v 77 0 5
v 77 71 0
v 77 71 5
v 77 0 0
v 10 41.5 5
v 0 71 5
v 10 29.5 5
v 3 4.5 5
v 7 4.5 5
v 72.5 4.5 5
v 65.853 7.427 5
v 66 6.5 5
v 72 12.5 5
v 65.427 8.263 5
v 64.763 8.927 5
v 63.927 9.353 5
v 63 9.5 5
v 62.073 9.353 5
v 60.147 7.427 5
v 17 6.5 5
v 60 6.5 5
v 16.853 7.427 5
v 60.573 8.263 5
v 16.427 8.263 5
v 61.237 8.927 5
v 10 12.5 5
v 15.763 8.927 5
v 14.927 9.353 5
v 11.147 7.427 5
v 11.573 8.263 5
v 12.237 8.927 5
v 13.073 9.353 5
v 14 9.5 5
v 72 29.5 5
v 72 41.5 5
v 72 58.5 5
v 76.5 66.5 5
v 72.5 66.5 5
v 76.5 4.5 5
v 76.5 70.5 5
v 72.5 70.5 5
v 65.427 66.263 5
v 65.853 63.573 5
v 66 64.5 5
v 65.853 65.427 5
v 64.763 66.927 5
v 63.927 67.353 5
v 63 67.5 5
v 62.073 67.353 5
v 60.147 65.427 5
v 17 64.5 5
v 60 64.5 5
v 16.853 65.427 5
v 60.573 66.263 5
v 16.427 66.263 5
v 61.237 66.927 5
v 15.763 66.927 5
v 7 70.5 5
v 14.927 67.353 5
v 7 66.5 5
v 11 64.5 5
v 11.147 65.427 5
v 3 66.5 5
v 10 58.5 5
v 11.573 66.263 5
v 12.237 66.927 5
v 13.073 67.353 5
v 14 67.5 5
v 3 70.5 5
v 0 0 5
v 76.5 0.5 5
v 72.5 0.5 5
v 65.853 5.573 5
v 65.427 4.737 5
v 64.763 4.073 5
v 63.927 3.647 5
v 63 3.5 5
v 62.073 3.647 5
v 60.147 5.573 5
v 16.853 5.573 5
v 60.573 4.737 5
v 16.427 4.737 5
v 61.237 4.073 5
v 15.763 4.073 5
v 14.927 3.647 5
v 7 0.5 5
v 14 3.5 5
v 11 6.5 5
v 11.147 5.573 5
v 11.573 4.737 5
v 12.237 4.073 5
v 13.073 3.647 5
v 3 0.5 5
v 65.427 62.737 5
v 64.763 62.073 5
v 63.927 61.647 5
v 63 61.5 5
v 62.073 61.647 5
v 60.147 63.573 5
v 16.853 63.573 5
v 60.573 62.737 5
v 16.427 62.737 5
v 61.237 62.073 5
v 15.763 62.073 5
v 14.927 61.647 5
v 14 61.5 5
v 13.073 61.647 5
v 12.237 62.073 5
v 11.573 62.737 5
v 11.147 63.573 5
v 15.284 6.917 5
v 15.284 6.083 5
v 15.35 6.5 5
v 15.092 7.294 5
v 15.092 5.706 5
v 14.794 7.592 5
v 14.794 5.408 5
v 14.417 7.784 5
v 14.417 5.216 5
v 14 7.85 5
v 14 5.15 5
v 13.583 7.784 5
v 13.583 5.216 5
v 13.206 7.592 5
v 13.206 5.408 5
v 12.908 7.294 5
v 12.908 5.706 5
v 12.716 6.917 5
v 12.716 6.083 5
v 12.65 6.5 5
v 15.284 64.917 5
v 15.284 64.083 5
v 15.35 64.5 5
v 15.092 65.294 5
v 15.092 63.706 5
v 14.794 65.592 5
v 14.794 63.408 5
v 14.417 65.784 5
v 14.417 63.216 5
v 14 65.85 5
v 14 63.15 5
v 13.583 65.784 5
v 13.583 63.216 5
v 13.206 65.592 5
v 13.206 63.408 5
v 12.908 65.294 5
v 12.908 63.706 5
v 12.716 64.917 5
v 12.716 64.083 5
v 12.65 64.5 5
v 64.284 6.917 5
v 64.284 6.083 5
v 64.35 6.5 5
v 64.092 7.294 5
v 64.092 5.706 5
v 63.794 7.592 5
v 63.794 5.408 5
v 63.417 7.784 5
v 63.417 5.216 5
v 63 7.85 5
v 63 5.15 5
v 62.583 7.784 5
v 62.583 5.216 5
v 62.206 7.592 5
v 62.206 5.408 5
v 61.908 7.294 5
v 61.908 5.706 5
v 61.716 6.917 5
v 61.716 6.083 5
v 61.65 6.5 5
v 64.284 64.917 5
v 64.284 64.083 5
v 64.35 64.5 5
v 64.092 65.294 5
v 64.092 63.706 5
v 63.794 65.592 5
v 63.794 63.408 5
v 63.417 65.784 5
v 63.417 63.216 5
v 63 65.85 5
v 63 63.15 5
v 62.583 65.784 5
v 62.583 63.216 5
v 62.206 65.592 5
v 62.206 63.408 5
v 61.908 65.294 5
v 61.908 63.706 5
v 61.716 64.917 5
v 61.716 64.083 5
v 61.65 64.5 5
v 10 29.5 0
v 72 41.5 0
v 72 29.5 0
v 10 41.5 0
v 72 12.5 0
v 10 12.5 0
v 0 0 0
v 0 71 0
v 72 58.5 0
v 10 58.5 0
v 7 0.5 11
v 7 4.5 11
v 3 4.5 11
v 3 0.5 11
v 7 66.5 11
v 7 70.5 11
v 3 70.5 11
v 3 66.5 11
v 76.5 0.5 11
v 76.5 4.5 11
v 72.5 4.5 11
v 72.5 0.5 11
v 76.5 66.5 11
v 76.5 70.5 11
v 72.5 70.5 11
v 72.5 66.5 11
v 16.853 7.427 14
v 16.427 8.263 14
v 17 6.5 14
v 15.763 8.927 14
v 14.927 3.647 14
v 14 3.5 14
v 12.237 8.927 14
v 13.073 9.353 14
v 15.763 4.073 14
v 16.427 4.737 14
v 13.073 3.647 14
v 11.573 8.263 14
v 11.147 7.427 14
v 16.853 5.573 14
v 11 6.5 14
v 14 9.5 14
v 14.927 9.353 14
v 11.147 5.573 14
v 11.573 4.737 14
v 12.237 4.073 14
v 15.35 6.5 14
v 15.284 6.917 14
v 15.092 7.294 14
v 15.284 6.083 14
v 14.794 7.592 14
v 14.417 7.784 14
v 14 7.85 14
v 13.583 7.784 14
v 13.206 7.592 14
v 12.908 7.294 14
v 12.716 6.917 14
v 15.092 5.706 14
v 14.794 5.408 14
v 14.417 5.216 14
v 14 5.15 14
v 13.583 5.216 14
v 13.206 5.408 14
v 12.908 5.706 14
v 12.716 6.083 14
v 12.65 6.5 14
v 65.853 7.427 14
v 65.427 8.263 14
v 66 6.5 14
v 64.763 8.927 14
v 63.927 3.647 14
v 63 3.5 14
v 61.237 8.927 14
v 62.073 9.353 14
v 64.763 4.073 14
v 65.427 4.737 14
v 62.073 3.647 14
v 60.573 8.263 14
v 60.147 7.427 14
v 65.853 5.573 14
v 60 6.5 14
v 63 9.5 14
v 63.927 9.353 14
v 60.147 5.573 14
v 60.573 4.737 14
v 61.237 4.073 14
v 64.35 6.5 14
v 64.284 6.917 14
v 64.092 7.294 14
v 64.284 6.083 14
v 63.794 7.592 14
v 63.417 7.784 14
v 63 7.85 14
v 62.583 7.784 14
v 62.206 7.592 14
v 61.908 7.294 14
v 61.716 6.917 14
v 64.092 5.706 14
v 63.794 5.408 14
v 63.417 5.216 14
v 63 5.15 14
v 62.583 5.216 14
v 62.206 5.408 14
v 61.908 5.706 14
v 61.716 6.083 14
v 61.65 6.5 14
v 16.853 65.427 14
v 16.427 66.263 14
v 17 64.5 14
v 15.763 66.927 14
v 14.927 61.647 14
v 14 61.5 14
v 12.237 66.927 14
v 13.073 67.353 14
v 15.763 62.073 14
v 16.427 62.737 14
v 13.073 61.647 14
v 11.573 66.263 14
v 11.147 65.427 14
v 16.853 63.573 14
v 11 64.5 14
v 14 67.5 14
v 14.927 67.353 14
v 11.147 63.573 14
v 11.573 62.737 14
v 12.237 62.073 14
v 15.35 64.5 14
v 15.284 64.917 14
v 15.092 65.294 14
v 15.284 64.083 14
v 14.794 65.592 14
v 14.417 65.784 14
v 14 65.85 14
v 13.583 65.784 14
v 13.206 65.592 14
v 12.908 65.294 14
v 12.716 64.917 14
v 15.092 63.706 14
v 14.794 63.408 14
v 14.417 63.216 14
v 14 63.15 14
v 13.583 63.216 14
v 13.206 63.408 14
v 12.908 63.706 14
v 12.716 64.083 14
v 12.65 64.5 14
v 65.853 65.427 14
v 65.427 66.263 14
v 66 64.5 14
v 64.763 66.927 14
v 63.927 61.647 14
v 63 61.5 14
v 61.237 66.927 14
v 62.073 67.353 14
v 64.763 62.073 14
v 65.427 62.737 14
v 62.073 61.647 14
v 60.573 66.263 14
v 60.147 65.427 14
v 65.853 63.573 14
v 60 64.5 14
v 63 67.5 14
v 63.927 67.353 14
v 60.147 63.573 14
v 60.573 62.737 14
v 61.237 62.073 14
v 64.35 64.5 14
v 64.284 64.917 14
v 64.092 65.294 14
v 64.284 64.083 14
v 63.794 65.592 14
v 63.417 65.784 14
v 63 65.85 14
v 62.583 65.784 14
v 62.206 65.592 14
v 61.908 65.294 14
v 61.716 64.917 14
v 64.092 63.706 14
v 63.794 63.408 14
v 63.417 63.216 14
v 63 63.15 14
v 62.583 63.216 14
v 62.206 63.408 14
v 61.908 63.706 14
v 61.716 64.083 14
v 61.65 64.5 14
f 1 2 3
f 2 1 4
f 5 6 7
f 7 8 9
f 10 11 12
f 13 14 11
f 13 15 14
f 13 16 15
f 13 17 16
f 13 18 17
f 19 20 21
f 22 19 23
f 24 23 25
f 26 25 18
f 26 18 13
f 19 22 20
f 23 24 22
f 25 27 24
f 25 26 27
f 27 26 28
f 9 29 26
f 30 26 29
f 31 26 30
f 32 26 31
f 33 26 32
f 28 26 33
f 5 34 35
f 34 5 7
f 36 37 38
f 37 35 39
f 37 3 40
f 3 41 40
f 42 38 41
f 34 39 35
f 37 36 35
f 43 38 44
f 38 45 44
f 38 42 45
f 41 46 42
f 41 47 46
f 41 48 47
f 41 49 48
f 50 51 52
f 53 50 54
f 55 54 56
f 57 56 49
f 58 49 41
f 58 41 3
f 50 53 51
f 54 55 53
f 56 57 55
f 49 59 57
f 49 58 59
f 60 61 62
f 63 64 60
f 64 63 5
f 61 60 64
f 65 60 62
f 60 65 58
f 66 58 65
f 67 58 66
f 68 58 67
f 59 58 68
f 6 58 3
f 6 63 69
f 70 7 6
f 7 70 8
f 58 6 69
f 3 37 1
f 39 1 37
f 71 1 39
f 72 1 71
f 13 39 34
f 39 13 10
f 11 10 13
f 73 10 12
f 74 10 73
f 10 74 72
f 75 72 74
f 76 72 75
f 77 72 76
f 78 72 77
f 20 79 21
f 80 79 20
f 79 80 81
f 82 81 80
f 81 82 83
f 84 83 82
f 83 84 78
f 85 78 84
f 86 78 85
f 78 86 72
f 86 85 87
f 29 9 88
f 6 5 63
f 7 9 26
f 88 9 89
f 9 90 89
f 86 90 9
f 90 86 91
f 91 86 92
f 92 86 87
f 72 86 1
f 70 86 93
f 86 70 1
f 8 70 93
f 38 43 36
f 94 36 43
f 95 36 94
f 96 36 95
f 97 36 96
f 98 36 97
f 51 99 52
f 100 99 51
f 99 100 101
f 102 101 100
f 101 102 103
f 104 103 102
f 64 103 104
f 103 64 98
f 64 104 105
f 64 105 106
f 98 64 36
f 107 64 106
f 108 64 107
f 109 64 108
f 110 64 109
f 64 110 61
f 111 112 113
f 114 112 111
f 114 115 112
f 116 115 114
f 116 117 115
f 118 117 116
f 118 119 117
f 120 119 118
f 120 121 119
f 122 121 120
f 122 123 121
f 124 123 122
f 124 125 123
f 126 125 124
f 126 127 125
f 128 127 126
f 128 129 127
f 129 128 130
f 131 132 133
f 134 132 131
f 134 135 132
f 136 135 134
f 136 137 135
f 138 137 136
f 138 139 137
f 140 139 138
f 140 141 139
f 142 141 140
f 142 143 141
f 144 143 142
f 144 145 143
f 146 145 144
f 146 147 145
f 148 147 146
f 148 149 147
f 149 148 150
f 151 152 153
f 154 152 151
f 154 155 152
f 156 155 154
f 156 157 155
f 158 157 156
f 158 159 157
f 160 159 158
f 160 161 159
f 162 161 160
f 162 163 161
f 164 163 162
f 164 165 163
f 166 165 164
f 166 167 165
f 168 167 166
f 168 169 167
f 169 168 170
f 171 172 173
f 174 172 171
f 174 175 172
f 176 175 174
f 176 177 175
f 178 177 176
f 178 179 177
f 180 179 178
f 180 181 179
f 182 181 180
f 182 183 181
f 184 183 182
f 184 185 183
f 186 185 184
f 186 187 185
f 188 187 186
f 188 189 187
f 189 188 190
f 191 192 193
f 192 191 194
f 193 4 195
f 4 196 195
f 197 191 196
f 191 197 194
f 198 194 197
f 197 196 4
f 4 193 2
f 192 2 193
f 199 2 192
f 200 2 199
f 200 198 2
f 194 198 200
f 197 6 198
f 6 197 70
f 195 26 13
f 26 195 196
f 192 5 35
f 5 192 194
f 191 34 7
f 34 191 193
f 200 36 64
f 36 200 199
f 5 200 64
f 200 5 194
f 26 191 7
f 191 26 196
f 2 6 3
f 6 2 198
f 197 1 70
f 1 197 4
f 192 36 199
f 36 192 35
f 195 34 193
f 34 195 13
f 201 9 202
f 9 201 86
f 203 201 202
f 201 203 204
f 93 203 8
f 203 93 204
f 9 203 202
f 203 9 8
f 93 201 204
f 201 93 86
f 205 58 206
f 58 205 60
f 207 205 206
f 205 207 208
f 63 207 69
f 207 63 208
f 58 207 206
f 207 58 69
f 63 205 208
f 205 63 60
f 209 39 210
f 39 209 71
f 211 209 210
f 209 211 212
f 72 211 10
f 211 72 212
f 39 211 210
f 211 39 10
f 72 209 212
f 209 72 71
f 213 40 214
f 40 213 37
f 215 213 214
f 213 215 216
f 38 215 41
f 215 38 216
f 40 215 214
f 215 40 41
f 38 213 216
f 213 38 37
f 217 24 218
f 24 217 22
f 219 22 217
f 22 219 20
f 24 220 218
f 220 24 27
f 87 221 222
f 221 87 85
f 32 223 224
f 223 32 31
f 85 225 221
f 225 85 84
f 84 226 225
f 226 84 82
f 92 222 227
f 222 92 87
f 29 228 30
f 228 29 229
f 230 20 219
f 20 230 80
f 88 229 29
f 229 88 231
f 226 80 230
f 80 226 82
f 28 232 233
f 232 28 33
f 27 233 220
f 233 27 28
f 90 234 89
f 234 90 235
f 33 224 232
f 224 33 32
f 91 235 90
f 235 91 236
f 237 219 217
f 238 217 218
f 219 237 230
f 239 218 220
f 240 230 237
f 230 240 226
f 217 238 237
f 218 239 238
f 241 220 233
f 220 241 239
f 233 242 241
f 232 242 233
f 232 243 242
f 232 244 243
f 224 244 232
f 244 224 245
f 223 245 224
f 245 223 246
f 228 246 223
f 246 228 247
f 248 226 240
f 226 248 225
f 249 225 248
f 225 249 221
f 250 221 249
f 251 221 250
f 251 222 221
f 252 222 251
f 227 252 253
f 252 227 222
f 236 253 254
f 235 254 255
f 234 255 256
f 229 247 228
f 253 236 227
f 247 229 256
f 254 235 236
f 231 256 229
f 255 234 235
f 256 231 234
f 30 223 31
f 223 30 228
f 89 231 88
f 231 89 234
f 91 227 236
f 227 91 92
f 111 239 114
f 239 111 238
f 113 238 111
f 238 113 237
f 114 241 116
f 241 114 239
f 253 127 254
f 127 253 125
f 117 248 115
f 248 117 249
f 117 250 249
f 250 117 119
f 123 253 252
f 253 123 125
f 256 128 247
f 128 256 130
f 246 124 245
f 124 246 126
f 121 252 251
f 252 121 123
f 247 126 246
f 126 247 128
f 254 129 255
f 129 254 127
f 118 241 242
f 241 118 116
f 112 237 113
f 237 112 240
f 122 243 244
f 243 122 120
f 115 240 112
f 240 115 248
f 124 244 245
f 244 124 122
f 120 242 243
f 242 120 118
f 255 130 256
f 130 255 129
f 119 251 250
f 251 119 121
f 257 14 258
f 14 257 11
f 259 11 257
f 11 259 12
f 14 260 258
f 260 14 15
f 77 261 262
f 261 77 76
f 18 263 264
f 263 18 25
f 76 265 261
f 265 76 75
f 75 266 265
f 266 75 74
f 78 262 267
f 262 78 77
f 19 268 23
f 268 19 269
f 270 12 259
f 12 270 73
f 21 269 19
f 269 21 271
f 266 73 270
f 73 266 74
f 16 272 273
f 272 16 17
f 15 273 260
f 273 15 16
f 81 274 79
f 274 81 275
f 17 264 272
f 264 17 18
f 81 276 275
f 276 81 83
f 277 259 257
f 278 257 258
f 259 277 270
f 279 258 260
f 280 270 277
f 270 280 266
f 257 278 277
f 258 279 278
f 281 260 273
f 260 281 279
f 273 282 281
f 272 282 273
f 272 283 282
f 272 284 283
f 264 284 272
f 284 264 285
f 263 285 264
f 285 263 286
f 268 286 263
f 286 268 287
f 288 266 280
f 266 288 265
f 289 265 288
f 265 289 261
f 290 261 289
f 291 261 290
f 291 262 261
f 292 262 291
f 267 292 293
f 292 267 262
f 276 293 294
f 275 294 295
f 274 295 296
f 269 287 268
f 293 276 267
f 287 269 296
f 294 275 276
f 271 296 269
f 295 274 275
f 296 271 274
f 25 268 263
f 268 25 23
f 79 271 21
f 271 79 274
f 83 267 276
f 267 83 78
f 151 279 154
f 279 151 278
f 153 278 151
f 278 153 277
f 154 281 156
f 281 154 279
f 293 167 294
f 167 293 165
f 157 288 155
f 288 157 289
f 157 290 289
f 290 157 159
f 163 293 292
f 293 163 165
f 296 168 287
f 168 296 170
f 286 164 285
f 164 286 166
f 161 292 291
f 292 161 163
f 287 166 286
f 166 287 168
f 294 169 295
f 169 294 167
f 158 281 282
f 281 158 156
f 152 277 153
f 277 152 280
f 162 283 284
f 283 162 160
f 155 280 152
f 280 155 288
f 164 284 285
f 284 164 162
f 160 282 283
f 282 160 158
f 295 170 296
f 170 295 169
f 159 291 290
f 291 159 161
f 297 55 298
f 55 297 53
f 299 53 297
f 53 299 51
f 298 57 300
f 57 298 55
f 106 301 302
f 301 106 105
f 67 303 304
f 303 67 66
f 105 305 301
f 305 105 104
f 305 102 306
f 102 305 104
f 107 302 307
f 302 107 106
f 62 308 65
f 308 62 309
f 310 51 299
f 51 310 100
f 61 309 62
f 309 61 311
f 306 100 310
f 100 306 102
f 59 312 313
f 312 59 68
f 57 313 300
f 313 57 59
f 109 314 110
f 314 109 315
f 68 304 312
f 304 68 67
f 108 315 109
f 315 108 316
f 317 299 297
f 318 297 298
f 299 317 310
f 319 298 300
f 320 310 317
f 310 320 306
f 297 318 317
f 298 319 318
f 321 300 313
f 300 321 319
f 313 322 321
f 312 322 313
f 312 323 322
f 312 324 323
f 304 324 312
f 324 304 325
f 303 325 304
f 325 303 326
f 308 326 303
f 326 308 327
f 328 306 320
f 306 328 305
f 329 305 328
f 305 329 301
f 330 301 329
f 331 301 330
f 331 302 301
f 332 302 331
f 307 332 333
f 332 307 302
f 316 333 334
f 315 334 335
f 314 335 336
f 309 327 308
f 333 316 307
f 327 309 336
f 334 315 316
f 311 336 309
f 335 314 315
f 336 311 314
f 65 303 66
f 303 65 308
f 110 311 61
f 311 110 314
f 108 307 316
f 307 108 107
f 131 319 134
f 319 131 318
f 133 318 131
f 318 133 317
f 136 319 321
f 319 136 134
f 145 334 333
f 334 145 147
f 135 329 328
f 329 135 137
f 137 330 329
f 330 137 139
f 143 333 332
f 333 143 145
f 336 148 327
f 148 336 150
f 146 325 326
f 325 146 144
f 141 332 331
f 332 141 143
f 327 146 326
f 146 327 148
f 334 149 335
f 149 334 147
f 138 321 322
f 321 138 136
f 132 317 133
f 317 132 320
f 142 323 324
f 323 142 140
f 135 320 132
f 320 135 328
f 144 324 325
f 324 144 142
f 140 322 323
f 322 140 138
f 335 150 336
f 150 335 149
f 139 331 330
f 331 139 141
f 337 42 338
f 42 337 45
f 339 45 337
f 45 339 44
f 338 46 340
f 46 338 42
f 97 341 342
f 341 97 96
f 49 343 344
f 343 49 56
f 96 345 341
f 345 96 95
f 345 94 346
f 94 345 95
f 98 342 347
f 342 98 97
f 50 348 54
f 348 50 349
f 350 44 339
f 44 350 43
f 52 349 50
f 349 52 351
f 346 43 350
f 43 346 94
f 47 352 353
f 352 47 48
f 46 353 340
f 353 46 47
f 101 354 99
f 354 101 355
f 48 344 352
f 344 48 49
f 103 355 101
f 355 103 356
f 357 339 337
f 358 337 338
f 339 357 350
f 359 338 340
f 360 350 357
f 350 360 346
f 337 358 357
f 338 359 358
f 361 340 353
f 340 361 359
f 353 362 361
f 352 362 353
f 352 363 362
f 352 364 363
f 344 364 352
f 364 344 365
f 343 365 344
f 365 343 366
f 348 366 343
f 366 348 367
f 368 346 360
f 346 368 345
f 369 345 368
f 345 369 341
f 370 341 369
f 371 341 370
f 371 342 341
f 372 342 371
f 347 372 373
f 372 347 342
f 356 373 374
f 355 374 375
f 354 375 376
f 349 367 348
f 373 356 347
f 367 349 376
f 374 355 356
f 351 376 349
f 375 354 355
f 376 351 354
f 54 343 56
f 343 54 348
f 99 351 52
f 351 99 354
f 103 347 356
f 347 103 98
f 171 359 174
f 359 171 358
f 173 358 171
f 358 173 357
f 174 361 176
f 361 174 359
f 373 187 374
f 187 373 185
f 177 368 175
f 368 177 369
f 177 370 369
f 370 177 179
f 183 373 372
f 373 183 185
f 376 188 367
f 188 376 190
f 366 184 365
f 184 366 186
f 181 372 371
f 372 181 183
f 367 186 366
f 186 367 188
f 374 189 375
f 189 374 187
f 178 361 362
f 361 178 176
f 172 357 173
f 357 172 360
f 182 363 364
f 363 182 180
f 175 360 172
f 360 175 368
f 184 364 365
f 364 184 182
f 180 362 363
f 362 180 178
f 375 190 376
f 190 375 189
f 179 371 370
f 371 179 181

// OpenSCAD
// Neato XV Signature Pro - Outer Left Pod BASE
// Print flat (ribbed face down), no supports needed.
// Has 4x4x6mm raised bosses at all 4 post locations.
// Bosses fit into matching sockets in outer_left_pod_sides.scad.
//
// PRINT ORIENTATION: ribbed bottom face flat on bed, standoffs point up.

// ============================================================
// PARAMETERS (must match outer_left_pod_sides.scad)
// ============================================================

pod_width  = 77;
pod_depth  = 71;

rail_w       = 5;
outer_rail_w = 10;
rib_w        = 12;

standoff_h    = 9;
standoff_od   = 6;
standoff_hole = 2.7; // M2.5


boss_size = 4;
boss_h    = 6;

yahboom_hole_x_span = 49;
yahboom_hole_y_span = 58;

yahboom_x_left  = (pod_width - yahboom_hole_x_span) / 2;
yahboom_x_right = yahboom_x_left + yahboom_hole_x_span;

yahboom_y_front = (pod_depth - yahboom_hole_y_span) / 2;
yahboom_y_rear  = yahboom_y_front + yahboom_hole_y_span;
yahboom_y_mid   = (yahboom_y_front + yahboom_y_rear) / 2;

rib_positions = [yahboom_y_front, yahboom_y_mid, yahboom_y_rear];

yahboom_holes = [
    [yahboom_x_left,  yahboom_y_front],
    [yahboom_x_right, yahboom_y_front],
    [yahboom_x_left,  yahboom_y_rear ],
    [yahboom_x_right, yahboom_y_rear ],
];

// Boss locations — center of each post footprint
// Outer (left) side: back, front
// Inner (right) side: back, front
boss_locations = [
    [outer_rail_w/2,          rail_w/2              ],  // outer back
    [outer_rail_w/2,          pod_depth - rail_w/2  ],  // outer front
    [pod_width - rail_w/2,    rail_w/2              ],  // inner back
    [pod_width - rail_w/2,    pod_depth - rail_w/2  ],  // inner front
];

// ============================================================
// MODULES
// ============================================================

module ribbed_bottom() {
    // Outer (left) edge — extra thick
    cube([outer_rail_w, pod_depth, rail_w]);
    // Inner (right) edge
    translate([pod_width - rail_w, 0, 0])
        cube([rail_w, pod_depth, rail_w]);
    // Back edge
    cube([pod_width, rail_w, rail_w]);
    // Front edge
    translate([0, pod_depth - rail_w, 0])
        cube([pod_width, rail_w, rail_w]);

    // Ribs — gaps between ribs provide cable routing space
    for (y_center = rib_positions) {
        translate([0, y_center - rib_w / 2, 0])
            cube([pod_width, rib_w, rail_w]);
    }
}

module standoff(h, hole_d) {
    difference() {
        cylinder(h=h, d=standoff_od, $fn=20);
        cylinder(h=h + 0.1, d=hole_d, $fn=20);
    }
}

// ============================================================
// MAIN
// ============================================================

union() {
    ribbed_bottom();

    for (b = boss_locations) {
        translate([b[0] - boss_size/2, b[1] - boss_size/2, rail_w])
            cube([boss_size, boss_size, boss_h]);
    }

    for (h = yahboom_holes) {
        translate([h[0], h[1], rail_w])
            standoff(standoff_h, standoff_hole);
    }
}
